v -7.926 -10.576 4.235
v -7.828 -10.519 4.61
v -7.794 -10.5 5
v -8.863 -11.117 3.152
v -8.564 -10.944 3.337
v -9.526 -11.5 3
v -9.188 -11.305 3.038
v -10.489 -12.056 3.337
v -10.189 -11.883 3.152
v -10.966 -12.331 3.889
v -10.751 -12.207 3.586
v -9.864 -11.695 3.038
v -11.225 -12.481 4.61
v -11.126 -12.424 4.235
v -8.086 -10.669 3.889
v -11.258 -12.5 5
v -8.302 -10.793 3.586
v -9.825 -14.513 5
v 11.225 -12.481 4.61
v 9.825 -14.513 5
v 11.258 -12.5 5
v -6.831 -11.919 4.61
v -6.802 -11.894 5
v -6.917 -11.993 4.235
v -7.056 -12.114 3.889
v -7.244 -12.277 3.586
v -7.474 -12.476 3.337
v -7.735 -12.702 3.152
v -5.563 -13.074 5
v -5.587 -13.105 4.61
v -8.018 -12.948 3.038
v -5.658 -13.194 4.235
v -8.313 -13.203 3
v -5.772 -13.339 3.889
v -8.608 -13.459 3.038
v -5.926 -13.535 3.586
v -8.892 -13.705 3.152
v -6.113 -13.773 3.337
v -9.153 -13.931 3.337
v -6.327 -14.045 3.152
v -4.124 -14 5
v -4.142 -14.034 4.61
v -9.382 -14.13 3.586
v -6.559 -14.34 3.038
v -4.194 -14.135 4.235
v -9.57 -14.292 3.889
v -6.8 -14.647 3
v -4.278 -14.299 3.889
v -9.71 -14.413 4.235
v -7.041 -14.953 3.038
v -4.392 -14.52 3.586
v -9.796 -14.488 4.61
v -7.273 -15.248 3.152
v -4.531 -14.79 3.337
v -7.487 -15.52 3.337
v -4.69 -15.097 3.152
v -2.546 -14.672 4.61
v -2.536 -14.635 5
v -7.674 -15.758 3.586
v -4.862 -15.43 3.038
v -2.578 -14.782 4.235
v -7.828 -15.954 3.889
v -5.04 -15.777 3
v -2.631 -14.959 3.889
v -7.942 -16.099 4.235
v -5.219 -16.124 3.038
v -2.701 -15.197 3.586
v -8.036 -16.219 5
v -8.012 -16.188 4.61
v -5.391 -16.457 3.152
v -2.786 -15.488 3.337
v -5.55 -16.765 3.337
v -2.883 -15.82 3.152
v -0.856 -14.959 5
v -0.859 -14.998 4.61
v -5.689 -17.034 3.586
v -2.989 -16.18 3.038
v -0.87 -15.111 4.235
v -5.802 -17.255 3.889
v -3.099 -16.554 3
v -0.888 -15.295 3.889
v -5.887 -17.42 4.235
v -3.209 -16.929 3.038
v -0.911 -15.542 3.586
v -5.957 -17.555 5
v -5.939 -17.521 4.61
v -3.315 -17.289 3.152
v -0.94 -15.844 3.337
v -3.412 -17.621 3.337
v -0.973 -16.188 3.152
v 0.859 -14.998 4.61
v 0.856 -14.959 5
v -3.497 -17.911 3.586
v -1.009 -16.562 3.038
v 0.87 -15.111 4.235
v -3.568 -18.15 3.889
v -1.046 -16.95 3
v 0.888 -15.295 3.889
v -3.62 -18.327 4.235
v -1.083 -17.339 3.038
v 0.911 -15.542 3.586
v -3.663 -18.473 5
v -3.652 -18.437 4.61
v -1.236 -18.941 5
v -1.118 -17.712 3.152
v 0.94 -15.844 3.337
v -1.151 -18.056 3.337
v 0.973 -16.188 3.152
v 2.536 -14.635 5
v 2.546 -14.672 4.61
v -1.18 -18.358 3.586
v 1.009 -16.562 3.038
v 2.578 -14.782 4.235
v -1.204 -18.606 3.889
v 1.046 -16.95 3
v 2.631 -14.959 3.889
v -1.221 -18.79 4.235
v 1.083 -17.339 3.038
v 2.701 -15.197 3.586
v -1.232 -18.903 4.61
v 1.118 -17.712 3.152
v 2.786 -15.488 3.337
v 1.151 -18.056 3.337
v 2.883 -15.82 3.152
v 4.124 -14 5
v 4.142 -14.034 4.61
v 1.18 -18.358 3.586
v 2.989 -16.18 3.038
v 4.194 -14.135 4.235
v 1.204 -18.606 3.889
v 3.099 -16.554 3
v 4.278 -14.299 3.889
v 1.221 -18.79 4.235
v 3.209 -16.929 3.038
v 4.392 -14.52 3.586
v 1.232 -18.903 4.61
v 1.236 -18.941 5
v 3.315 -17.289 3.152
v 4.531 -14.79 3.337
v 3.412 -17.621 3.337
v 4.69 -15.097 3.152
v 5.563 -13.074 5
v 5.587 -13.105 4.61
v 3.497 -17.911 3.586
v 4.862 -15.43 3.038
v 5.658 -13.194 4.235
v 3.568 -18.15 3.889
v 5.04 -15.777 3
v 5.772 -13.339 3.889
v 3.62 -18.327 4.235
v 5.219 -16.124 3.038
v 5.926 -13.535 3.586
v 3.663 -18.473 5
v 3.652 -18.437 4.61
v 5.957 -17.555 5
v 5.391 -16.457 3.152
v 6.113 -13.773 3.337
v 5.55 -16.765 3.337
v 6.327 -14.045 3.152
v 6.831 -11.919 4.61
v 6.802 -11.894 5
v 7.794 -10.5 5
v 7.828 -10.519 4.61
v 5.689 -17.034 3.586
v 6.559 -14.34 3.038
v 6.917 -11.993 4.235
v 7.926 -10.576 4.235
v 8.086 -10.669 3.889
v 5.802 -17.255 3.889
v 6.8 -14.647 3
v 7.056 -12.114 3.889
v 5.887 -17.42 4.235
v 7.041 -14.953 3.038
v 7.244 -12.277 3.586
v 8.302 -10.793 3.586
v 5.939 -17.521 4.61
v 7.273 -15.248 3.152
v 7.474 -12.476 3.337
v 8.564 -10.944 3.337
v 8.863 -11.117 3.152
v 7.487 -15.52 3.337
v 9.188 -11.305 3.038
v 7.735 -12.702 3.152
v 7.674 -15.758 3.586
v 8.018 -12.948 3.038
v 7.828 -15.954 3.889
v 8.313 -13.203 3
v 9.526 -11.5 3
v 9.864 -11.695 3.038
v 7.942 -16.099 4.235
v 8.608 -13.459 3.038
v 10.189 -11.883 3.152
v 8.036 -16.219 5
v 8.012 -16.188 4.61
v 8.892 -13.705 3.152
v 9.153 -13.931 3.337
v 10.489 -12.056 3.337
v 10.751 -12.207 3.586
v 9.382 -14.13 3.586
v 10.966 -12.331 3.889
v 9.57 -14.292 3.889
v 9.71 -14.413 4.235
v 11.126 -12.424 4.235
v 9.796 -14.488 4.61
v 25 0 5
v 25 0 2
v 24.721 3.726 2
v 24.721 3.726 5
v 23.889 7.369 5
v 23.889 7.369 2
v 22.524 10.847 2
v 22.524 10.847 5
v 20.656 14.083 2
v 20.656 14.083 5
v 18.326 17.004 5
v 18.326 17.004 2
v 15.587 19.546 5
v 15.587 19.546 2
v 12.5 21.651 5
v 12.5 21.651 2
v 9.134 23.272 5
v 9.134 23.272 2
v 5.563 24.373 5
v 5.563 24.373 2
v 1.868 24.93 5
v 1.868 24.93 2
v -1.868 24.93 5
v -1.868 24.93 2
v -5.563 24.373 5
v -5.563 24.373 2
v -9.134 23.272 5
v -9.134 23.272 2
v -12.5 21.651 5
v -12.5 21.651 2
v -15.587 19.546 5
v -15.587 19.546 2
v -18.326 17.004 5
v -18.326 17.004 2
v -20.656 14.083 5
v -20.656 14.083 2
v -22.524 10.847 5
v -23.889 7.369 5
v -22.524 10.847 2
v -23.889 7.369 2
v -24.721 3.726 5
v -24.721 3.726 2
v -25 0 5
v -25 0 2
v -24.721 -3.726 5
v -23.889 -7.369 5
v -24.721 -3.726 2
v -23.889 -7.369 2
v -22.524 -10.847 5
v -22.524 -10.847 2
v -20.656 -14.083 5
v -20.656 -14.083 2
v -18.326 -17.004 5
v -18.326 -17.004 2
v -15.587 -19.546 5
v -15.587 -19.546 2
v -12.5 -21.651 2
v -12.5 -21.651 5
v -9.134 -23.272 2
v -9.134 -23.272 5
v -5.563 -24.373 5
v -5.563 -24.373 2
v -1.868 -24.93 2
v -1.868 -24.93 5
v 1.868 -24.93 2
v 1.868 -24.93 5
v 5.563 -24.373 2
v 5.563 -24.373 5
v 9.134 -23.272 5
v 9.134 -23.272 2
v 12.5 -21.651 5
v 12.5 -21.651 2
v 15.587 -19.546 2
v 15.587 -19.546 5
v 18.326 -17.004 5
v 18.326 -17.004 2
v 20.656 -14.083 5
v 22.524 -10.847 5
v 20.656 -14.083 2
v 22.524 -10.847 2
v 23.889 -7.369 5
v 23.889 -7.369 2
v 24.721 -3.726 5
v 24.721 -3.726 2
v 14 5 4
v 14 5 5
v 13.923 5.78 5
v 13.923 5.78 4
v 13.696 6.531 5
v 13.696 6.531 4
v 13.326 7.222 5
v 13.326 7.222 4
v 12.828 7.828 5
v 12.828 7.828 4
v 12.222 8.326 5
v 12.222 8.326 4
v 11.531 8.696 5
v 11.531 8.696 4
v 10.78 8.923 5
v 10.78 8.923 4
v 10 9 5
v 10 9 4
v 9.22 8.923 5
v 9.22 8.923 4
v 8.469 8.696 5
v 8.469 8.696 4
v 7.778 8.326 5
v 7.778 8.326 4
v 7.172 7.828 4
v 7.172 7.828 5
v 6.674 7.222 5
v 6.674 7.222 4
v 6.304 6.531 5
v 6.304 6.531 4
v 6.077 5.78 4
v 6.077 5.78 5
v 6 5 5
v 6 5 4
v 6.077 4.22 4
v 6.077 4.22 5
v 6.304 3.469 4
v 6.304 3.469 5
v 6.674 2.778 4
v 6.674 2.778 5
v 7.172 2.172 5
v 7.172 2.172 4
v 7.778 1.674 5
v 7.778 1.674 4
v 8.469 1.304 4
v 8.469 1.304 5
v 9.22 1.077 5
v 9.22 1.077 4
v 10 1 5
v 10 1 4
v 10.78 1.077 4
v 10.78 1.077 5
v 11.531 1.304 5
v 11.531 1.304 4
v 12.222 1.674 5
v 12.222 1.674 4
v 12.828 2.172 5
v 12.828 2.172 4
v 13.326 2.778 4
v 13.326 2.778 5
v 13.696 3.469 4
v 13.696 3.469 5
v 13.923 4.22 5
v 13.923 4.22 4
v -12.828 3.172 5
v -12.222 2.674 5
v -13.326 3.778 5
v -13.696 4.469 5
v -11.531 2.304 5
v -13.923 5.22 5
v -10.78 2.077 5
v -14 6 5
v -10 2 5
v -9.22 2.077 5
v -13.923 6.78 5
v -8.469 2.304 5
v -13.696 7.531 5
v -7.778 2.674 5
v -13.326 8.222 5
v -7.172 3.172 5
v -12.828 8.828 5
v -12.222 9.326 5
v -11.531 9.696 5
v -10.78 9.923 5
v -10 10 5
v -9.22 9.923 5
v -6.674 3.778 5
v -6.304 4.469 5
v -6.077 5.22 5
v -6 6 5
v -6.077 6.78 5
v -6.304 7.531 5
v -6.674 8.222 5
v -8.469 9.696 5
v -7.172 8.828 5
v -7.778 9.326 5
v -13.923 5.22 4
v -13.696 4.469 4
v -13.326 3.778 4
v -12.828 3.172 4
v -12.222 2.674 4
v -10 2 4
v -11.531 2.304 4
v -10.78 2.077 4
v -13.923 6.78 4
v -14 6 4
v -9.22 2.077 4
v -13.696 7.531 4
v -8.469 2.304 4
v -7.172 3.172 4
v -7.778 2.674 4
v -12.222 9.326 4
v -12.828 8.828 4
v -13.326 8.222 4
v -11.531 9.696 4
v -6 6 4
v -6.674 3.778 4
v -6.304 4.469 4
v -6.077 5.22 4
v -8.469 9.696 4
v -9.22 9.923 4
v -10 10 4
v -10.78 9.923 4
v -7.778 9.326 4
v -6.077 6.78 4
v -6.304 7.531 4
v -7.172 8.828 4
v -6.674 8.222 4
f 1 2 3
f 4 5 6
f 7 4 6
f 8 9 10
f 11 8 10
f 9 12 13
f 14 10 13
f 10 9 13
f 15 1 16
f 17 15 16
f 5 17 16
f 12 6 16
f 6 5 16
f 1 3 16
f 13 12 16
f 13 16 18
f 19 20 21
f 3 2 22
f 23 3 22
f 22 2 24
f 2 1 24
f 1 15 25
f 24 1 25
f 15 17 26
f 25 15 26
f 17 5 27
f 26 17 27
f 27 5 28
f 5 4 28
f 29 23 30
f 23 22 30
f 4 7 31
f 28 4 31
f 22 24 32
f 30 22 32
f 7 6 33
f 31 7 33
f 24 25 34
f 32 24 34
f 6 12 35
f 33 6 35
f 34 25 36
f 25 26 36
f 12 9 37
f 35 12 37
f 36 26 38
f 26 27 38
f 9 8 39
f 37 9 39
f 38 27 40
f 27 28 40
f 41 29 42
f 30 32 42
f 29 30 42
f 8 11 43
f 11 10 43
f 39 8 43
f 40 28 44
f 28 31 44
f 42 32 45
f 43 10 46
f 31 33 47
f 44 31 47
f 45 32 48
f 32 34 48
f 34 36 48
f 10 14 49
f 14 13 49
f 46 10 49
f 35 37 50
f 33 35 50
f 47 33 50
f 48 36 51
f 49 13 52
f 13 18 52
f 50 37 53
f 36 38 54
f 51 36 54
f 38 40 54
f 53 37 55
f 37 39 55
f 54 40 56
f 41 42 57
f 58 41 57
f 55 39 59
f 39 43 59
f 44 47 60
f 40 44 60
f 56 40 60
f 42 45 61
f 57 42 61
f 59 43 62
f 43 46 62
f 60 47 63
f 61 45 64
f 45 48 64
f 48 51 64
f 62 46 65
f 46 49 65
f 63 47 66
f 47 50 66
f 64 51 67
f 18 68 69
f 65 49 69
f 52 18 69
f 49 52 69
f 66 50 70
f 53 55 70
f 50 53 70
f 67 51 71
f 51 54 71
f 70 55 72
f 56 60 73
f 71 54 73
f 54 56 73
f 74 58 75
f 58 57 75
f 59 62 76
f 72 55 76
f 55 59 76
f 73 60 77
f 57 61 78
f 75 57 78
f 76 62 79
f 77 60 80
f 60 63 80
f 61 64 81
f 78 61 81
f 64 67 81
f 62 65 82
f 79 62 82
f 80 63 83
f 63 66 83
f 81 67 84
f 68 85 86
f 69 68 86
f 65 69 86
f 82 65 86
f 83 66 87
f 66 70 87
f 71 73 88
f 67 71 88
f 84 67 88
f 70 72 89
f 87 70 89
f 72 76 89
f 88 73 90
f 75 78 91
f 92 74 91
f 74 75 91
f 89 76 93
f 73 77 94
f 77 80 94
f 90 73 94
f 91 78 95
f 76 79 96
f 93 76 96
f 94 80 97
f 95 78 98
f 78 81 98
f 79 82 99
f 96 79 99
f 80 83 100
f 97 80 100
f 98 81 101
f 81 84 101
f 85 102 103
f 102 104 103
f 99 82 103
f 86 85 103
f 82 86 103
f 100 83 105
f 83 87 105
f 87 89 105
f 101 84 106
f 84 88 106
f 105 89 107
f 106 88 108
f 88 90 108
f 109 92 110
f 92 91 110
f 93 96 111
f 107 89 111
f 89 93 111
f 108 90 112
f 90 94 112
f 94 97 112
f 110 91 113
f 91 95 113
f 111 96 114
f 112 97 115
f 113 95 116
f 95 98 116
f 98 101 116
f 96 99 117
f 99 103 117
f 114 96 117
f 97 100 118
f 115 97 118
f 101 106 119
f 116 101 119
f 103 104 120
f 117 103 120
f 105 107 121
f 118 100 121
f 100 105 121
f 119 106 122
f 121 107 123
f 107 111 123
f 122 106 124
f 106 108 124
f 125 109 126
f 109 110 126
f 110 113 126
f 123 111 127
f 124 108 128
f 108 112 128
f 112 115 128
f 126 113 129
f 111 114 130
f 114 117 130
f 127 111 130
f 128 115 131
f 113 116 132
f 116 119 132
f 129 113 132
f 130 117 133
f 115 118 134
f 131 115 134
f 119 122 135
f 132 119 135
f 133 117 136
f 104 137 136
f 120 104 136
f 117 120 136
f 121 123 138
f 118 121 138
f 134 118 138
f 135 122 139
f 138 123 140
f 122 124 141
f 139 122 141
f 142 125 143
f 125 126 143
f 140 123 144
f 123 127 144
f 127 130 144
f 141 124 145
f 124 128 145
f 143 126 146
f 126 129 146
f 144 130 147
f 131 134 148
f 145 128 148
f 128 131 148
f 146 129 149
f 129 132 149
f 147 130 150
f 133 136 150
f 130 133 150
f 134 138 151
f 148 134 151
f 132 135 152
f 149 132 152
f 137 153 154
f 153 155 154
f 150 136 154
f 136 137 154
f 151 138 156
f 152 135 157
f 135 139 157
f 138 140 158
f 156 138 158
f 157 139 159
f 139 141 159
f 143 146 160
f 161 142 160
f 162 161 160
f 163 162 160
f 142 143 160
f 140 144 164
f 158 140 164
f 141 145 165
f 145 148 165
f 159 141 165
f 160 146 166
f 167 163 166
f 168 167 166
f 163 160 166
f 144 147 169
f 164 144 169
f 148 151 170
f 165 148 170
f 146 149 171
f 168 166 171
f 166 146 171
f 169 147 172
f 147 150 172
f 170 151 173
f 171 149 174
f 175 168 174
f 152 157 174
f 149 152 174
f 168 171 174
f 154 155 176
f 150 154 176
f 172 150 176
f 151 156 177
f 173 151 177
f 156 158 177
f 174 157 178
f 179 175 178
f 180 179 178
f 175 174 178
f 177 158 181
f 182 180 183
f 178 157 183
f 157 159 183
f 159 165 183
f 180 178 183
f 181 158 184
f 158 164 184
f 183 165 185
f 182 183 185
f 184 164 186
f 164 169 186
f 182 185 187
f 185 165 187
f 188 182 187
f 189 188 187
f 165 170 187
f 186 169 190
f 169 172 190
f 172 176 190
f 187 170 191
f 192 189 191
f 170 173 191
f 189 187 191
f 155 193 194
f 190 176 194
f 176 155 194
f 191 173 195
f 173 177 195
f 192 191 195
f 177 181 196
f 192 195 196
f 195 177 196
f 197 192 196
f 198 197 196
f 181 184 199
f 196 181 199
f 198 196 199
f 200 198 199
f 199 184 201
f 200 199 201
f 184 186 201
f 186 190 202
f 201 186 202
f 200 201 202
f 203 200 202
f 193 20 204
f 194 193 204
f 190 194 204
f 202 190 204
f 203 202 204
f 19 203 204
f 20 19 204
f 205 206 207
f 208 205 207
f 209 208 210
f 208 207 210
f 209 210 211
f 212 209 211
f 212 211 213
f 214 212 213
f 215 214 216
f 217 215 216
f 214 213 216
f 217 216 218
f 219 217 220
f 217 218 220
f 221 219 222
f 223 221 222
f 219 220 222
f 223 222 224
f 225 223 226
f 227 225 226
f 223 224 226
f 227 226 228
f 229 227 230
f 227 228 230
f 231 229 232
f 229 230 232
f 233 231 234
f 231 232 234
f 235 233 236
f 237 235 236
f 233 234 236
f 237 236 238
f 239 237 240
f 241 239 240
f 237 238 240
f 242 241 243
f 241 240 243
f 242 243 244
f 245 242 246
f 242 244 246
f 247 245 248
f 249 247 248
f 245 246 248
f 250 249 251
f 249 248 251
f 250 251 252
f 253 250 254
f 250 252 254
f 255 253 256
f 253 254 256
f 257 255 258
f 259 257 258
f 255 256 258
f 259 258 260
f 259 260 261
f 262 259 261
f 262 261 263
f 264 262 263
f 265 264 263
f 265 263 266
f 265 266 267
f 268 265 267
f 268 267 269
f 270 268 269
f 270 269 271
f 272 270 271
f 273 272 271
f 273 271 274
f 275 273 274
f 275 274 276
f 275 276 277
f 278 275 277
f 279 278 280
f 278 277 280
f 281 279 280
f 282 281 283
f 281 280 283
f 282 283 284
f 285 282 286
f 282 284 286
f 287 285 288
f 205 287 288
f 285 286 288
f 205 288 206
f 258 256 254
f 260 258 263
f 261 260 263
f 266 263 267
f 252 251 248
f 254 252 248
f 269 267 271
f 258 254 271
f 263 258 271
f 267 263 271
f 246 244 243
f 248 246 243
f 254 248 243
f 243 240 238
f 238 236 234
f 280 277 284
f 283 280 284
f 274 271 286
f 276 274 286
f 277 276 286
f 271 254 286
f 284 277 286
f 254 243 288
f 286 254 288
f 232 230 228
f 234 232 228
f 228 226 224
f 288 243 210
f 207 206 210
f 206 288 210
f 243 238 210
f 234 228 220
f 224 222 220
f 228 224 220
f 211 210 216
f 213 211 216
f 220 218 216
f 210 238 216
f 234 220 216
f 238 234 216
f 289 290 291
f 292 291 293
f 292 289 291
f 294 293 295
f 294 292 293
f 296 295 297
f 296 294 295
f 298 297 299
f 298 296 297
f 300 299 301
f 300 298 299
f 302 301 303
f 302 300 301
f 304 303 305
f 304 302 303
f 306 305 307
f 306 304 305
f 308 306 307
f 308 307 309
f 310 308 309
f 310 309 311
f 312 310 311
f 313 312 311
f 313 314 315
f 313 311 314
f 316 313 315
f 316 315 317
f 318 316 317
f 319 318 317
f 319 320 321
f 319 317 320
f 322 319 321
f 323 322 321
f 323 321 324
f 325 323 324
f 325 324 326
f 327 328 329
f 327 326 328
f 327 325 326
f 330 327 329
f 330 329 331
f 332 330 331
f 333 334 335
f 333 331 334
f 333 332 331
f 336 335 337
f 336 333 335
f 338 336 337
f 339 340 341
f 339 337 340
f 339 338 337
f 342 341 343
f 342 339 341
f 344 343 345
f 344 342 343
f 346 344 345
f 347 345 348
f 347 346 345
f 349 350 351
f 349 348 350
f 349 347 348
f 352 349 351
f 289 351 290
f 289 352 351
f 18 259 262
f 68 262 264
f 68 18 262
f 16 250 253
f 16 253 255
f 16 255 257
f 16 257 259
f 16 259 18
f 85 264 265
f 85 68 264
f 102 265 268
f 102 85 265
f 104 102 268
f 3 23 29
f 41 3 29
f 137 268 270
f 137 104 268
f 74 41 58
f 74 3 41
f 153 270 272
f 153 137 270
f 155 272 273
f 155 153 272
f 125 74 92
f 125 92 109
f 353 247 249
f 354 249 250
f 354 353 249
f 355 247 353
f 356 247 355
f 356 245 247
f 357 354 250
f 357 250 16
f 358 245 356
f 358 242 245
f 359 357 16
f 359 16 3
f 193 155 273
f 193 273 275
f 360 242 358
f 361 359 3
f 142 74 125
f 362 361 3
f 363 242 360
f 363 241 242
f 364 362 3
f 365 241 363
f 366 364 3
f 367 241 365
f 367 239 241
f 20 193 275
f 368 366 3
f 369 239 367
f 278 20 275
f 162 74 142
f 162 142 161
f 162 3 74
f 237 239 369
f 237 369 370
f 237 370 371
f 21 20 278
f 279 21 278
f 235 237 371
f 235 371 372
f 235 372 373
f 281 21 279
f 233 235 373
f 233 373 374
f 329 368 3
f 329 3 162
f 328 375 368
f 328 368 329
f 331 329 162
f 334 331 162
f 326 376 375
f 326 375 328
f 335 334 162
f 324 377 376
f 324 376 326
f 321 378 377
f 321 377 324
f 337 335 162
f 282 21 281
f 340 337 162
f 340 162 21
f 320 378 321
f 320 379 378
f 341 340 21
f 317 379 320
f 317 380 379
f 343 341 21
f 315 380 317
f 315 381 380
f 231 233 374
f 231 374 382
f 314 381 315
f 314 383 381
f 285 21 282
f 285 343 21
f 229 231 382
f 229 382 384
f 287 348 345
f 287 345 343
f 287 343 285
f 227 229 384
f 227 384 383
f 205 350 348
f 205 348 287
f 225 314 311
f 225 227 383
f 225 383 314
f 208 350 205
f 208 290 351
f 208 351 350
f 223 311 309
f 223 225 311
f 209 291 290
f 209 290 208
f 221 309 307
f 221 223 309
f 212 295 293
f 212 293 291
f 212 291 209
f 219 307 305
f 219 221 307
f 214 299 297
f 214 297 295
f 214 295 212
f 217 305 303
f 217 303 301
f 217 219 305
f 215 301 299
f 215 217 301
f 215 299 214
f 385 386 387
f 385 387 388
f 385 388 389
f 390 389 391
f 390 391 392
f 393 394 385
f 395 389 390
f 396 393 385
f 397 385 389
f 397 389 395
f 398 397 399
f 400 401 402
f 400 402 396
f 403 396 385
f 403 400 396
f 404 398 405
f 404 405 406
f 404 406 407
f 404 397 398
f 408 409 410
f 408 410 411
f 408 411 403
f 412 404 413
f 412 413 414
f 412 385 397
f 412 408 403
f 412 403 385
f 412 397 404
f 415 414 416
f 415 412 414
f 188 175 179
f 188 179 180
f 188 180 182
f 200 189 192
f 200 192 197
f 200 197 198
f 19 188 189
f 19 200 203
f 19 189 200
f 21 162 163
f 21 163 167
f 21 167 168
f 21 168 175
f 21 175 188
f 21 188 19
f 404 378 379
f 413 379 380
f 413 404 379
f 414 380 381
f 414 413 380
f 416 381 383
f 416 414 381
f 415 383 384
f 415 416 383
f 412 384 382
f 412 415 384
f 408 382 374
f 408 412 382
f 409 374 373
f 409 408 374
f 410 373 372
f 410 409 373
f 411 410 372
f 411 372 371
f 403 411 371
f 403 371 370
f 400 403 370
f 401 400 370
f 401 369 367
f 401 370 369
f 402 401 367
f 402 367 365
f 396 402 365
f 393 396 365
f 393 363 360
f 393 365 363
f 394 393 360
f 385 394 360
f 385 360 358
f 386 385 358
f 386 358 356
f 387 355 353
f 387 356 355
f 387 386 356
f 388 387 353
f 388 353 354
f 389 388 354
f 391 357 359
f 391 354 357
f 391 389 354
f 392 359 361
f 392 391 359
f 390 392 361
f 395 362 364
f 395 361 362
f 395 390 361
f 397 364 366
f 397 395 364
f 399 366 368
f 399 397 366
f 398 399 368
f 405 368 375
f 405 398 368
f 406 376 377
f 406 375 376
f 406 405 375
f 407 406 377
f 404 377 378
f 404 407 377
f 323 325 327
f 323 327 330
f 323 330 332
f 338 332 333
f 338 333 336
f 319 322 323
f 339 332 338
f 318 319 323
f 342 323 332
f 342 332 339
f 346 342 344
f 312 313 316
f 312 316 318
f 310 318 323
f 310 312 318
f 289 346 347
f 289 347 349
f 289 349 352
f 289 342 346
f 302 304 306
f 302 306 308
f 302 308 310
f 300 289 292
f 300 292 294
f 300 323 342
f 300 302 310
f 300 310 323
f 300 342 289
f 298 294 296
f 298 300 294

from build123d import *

# Parameters (mm, degrees)
TORUS_R               = 2
TORUS_ANGLE           = 120
TORUS_PLACEMENT_ANGLE = 150
CYLINDER002_R         = 4
CYLINDER002_DEPTH     = 4
CYLINDER001_R         = 4
CYLINDER001_DEPTH     = 4
CYLINDER_R            = 25
CYLINDER_DEPTH        = 3


with BuildPart() as torus:
    # Torus → Torus (revolve)
    with BuildSketch(Plane.XZ):
        with Locations((11, 0)):
            Circle(TORUS_R)
    revolve(axis=Axis((0, 0, 0), (0, 0, 1)), revolution_arc=TORUS_ANGLE)


with BuildPart() as torus_1:
    # Torus placement: moved
    add(torus.part.moved(Location((0, -6, 5))).rotate(Axis((0, -6, 5), (0, 0, -1)), TORUS_PLACEMENT_ANGLE))


with BuildPart() as cilindre002:
    # Cylinder002 → Cylinder002 (new body)
    with BuildSketch(Plane(origin=(10, 5, 2), x_dir=(1, 0, 0), z_dir=(0, 0, 1))):
        Circle(CYLINDER002_R)
    extrude(amount=CYLINDER002_DEPTH)


with BuildPart() as cilindre001:
    # Cylinder001 → Cylinder001 (new body)
    with BuildSketch(Plane(origin=(-10, 6, 2), x_dir=(1, 0, 0), z_dir=(0, 0, 1))):
        Circle(CYLINDER001_R)
    extrude(amount=CYLINDER001_DEPTH)


with BuildPart() as cut002:
    # Cylinder → Cylinder (new body)
    with BuildSketch(Plane.XY):
        Circle(CYLINDER_R)
    extrude(amount=CYLINDER_DEPTH)

    # Cut: cut Cilindre001
    add(cilindre001.part, mode=Mode.SUBTRACT)

    # Cut001: cut Cilindre002
    add(cilindre002.part, mode=Mode.SUBTRACT)


with BuildPart() as cut002_1:
    # Cut001 placement: moved
    add(cut002.part.moved(Location((0, 0, 2))))

    # Cut002: cut Torus
    add(torus_1.part, mode=Mode.SUBTRACT)


solid = cut002_1.part
